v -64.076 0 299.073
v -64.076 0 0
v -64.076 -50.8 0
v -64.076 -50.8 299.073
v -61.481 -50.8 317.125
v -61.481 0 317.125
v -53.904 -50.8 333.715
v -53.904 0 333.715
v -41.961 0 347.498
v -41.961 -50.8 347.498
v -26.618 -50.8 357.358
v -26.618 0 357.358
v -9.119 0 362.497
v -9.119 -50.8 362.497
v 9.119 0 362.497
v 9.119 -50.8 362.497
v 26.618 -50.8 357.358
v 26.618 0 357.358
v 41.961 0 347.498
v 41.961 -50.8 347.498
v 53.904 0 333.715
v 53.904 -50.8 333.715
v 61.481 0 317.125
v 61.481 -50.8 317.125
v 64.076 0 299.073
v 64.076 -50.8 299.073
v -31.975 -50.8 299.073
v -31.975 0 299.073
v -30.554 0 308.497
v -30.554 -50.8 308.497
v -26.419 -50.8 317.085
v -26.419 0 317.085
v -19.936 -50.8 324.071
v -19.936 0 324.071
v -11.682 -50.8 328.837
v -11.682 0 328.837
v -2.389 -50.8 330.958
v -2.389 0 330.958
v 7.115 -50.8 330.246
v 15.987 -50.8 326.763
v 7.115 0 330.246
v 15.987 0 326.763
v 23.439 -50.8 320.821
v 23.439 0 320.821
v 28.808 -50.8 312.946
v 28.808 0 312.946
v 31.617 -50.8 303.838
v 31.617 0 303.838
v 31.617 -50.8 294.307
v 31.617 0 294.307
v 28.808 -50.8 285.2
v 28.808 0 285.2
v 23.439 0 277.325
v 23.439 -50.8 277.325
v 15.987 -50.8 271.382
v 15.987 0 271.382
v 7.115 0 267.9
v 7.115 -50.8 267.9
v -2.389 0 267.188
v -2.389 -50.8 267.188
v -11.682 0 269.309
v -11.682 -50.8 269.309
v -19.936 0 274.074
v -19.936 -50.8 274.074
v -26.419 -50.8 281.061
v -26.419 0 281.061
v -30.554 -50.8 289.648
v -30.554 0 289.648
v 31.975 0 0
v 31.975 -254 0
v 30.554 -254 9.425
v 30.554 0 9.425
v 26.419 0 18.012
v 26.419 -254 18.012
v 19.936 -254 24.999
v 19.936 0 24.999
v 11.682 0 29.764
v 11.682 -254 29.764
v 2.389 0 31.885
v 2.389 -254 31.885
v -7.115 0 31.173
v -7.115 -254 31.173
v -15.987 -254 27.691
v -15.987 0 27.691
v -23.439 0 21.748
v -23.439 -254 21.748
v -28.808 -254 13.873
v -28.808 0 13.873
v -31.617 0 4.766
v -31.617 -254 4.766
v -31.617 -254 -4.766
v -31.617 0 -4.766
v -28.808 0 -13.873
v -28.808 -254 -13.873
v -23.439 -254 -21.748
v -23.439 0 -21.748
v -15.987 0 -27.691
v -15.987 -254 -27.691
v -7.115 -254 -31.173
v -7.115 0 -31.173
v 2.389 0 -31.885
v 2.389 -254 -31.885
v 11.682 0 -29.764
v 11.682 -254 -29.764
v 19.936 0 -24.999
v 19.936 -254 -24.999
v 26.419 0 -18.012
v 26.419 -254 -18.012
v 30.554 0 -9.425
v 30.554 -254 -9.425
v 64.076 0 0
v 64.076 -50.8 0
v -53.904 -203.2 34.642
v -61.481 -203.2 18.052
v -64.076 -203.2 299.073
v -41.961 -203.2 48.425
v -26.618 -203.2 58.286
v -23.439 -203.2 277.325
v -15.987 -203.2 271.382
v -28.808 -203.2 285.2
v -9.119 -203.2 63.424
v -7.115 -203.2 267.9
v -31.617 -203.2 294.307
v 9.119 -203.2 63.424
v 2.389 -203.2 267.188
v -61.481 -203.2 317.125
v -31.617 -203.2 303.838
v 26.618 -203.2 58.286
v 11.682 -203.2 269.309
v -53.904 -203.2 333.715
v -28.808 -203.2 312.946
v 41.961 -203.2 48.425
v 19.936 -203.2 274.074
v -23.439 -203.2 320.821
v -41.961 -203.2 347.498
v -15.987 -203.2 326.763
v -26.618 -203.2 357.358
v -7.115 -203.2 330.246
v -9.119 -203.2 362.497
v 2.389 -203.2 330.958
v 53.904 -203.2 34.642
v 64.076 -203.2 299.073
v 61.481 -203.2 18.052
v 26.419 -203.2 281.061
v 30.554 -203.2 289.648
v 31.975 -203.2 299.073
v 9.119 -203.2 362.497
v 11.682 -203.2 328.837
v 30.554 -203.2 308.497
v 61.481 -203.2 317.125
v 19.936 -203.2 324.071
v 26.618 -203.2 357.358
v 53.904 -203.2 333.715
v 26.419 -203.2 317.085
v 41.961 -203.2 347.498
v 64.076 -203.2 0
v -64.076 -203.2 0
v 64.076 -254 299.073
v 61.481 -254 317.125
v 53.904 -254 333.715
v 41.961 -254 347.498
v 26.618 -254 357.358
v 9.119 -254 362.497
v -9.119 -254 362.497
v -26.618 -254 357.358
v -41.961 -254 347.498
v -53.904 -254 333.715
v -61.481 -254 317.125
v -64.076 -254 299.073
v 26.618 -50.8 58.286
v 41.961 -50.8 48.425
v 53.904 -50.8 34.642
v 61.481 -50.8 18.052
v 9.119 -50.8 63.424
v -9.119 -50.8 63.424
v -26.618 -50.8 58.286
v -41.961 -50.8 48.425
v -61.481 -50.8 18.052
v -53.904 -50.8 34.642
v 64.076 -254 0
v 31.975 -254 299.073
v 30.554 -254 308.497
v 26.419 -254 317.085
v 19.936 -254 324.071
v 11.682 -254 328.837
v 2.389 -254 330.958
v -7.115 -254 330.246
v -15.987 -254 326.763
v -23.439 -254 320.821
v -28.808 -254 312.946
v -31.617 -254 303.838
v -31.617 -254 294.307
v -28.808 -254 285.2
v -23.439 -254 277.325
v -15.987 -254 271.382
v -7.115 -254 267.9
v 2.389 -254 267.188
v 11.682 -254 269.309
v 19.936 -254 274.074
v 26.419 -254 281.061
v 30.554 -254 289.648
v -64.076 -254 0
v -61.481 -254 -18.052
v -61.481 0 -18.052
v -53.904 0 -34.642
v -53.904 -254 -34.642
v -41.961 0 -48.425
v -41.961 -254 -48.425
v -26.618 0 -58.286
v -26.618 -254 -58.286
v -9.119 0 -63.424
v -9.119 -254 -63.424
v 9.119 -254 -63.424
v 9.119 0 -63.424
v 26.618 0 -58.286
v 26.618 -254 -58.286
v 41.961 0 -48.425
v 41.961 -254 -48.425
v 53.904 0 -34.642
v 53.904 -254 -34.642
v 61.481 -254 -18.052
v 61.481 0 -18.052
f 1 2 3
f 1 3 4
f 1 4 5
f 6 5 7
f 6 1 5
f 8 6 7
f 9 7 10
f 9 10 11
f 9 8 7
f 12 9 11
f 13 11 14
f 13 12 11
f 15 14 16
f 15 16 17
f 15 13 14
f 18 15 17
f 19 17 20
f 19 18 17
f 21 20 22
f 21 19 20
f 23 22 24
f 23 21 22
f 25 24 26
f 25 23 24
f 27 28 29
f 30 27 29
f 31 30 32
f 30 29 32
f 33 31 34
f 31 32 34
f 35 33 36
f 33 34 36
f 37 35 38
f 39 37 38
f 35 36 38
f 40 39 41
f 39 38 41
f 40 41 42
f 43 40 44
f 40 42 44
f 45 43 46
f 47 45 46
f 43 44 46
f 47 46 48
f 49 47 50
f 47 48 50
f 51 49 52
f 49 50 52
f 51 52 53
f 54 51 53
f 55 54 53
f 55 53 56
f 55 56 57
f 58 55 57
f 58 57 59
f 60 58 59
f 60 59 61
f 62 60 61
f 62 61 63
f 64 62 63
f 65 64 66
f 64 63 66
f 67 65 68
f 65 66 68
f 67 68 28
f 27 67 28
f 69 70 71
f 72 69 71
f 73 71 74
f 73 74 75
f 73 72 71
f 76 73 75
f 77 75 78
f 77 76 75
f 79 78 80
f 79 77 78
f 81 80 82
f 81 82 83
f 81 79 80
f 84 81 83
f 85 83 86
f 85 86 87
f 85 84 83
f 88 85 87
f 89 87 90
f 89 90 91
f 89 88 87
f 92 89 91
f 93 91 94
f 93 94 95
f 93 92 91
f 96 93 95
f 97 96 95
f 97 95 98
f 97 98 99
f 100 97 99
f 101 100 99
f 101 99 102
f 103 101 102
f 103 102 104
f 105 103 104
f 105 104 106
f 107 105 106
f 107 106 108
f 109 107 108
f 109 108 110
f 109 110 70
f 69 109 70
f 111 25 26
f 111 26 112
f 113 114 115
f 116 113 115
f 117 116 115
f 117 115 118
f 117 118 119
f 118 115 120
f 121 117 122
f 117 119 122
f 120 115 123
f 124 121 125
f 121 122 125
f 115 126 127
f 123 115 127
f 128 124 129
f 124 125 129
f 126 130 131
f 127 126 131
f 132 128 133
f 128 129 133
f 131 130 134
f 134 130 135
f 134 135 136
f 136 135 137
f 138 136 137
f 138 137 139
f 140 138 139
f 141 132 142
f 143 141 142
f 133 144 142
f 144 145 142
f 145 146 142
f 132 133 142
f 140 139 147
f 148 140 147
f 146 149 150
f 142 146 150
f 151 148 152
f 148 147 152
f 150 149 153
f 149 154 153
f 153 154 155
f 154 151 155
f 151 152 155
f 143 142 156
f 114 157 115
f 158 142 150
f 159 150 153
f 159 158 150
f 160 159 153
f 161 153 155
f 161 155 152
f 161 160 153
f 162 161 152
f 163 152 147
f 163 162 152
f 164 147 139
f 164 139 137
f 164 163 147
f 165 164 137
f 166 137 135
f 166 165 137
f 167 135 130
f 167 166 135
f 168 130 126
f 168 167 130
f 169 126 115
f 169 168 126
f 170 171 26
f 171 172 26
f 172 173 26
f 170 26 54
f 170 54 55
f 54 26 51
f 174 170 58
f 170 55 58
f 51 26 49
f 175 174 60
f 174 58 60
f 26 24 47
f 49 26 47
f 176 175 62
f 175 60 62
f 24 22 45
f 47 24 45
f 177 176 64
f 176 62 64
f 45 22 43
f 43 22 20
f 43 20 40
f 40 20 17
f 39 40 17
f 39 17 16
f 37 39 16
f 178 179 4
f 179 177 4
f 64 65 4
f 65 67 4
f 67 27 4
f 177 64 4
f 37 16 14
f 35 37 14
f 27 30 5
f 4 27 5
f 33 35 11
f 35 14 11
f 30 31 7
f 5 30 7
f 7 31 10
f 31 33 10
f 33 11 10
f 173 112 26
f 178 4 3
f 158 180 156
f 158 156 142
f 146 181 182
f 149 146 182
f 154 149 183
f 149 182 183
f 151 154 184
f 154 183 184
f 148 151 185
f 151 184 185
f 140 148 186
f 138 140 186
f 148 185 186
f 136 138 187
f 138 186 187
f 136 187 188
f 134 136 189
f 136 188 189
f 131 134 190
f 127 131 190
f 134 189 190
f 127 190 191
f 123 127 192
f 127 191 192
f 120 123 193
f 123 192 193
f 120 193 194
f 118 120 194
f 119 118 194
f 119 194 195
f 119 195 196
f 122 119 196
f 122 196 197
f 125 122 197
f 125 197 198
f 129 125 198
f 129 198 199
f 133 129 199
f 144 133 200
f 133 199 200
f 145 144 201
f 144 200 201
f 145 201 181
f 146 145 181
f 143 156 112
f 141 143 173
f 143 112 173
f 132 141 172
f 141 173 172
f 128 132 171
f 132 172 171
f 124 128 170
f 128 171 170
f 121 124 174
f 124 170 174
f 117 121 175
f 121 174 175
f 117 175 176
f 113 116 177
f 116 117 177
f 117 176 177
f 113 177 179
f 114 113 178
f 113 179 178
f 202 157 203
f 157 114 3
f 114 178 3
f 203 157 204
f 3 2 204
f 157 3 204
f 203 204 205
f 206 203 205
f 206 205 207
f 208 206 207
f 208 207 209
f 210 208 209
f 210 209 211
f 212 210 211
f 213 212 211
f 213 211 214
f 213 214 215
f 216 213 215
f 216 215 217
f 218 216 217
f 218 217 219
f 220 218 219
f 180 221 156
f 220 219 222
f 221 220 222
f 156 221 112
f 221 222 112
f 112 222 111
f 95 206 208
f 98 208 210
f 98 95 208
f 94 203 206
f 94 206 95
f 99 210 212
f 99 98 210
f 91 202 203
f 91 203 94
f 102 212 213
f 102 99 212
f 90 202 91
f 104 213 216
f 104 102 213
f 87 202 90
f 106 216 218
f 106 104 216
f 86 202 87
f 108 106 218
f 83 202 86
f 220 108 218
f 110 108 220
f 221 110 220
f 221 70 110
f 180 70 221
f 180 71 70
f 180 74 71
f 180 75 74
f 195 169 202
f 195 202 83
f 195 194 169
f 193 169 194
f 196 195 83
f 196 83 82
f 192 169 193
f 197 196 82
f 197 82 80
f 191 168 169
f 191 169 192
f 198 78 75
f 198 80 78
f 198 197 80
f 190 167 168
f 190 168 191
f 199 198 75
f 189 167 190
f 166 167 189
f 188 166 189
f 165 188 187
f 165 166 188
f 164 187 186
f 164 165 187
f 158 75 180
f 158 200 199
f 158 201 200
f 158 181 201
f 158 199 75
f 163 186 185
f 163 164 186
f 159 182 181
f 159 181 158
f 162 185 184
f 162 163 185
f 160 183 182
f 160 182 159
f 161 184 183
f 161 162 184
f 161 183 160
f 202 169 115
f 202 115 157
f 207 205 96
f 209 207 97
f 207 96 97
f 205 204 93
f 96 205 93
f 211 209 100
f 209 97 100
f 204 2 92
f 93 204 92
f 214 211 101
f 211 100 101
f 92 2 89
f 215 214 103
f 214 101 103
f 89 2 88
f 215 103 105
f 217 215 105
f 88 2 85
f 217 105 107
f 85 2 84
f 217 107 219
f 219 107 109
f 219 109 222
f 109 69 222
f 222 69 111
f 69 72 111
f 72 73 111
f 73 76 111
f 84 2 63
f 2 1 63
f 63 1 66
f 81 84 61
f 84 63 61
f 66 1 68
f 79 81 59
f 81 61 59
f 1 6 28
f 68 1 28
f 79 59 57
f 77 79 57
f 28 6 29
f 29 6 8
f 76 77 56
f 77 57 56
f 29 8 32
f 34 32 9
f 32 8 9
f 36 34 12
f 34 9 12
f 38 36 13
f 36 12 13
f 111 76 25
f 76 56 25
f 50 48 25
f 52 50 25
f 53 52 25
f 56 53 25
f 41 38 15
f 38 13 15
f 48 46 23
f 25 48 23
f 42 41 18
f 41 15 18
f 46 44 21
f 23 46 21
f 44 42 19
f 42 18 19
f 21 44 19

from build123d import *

# Parameters (mm, degrees)
F0_R     = 64.0760449632
F0_R_2   = 31.9745078145
F1_DEPTH = 254
F2_R     = 31.9745078145
F3_DEPTH = 50.8
F4_R     = 31.9745078145
F5_DEPTH = 50.8


with BuildPart() as f1:
    # F0 (on Front) → F1 (new body)
    with BuildSketch(Plane.XZ):
        Circle(F0_R)
        Circle(F0_R_2, mode=Mode.SUBTRACT)
    extrude(amount=F1_DEPTH)

    # F2 (on face) → F3 (join)
    with BuildSketch(Plane(origin=(0, 0, 0), x_dir=(-1, 0, 0), z_dir=(0, 1, 0))):
        with BuildLine():
            ThreePointArc((-64.0760449632, 0), (0, -64.0760449632), (64.0760449632, 0))
            ThreePointArc((64.0760449632, 0), (0, 64.0760449632), (-64.0760449632, 0))
        make_face()
        Circle(F2_R, mode=Mode.SUBTRACT)
        with BuildLine():
            ThreePointArc((-64.0760449632, 0), (0, 64.0760449632), (64.0760449632, 0))
            Line((64.0760449632, 0), (64.0760449632, 299.0727424622))
            ThreePointArc((64.0760449632, 299.0727424622), (0, 363.1487874254), (-64.0760449632, 299.0727424622))
            Line((-64.0760449632, 299.0727424622), (-64.0760449632, 0))
        make_face()
        with Locations((0, 299.0727424622)):
            Circle(F2_R, mode=Mode.SUBTRACT)
    extrude(amount=-F3_DEPTH)

    # F4 (on face) → F5 (join)
    with BuildSketch(Plane.XZ.offset(254)):
        with BuildLine():
            Line((64.0760449632, 0), (64.0760449632, 299.0727424622))
            ThreePointArc((64.0760449632, 299.0727424622), (0, 363.1487874254), (-64.0760449632, 299.0727424622))
            Line((-64.0760449632, 299.0727424622), (-64.0760449632, 0))
            ThreePointArc((-64.0760449632, 0), (0, 64.0760449632), (64.0760449632, 0))
        make_face()
        with Locations((0, 299.0727424622)):
            Circle(F4_R, mode=Mode.SUBTRACT)
    extrude(amount=-F5_DEPTH)


solid = f1.part
